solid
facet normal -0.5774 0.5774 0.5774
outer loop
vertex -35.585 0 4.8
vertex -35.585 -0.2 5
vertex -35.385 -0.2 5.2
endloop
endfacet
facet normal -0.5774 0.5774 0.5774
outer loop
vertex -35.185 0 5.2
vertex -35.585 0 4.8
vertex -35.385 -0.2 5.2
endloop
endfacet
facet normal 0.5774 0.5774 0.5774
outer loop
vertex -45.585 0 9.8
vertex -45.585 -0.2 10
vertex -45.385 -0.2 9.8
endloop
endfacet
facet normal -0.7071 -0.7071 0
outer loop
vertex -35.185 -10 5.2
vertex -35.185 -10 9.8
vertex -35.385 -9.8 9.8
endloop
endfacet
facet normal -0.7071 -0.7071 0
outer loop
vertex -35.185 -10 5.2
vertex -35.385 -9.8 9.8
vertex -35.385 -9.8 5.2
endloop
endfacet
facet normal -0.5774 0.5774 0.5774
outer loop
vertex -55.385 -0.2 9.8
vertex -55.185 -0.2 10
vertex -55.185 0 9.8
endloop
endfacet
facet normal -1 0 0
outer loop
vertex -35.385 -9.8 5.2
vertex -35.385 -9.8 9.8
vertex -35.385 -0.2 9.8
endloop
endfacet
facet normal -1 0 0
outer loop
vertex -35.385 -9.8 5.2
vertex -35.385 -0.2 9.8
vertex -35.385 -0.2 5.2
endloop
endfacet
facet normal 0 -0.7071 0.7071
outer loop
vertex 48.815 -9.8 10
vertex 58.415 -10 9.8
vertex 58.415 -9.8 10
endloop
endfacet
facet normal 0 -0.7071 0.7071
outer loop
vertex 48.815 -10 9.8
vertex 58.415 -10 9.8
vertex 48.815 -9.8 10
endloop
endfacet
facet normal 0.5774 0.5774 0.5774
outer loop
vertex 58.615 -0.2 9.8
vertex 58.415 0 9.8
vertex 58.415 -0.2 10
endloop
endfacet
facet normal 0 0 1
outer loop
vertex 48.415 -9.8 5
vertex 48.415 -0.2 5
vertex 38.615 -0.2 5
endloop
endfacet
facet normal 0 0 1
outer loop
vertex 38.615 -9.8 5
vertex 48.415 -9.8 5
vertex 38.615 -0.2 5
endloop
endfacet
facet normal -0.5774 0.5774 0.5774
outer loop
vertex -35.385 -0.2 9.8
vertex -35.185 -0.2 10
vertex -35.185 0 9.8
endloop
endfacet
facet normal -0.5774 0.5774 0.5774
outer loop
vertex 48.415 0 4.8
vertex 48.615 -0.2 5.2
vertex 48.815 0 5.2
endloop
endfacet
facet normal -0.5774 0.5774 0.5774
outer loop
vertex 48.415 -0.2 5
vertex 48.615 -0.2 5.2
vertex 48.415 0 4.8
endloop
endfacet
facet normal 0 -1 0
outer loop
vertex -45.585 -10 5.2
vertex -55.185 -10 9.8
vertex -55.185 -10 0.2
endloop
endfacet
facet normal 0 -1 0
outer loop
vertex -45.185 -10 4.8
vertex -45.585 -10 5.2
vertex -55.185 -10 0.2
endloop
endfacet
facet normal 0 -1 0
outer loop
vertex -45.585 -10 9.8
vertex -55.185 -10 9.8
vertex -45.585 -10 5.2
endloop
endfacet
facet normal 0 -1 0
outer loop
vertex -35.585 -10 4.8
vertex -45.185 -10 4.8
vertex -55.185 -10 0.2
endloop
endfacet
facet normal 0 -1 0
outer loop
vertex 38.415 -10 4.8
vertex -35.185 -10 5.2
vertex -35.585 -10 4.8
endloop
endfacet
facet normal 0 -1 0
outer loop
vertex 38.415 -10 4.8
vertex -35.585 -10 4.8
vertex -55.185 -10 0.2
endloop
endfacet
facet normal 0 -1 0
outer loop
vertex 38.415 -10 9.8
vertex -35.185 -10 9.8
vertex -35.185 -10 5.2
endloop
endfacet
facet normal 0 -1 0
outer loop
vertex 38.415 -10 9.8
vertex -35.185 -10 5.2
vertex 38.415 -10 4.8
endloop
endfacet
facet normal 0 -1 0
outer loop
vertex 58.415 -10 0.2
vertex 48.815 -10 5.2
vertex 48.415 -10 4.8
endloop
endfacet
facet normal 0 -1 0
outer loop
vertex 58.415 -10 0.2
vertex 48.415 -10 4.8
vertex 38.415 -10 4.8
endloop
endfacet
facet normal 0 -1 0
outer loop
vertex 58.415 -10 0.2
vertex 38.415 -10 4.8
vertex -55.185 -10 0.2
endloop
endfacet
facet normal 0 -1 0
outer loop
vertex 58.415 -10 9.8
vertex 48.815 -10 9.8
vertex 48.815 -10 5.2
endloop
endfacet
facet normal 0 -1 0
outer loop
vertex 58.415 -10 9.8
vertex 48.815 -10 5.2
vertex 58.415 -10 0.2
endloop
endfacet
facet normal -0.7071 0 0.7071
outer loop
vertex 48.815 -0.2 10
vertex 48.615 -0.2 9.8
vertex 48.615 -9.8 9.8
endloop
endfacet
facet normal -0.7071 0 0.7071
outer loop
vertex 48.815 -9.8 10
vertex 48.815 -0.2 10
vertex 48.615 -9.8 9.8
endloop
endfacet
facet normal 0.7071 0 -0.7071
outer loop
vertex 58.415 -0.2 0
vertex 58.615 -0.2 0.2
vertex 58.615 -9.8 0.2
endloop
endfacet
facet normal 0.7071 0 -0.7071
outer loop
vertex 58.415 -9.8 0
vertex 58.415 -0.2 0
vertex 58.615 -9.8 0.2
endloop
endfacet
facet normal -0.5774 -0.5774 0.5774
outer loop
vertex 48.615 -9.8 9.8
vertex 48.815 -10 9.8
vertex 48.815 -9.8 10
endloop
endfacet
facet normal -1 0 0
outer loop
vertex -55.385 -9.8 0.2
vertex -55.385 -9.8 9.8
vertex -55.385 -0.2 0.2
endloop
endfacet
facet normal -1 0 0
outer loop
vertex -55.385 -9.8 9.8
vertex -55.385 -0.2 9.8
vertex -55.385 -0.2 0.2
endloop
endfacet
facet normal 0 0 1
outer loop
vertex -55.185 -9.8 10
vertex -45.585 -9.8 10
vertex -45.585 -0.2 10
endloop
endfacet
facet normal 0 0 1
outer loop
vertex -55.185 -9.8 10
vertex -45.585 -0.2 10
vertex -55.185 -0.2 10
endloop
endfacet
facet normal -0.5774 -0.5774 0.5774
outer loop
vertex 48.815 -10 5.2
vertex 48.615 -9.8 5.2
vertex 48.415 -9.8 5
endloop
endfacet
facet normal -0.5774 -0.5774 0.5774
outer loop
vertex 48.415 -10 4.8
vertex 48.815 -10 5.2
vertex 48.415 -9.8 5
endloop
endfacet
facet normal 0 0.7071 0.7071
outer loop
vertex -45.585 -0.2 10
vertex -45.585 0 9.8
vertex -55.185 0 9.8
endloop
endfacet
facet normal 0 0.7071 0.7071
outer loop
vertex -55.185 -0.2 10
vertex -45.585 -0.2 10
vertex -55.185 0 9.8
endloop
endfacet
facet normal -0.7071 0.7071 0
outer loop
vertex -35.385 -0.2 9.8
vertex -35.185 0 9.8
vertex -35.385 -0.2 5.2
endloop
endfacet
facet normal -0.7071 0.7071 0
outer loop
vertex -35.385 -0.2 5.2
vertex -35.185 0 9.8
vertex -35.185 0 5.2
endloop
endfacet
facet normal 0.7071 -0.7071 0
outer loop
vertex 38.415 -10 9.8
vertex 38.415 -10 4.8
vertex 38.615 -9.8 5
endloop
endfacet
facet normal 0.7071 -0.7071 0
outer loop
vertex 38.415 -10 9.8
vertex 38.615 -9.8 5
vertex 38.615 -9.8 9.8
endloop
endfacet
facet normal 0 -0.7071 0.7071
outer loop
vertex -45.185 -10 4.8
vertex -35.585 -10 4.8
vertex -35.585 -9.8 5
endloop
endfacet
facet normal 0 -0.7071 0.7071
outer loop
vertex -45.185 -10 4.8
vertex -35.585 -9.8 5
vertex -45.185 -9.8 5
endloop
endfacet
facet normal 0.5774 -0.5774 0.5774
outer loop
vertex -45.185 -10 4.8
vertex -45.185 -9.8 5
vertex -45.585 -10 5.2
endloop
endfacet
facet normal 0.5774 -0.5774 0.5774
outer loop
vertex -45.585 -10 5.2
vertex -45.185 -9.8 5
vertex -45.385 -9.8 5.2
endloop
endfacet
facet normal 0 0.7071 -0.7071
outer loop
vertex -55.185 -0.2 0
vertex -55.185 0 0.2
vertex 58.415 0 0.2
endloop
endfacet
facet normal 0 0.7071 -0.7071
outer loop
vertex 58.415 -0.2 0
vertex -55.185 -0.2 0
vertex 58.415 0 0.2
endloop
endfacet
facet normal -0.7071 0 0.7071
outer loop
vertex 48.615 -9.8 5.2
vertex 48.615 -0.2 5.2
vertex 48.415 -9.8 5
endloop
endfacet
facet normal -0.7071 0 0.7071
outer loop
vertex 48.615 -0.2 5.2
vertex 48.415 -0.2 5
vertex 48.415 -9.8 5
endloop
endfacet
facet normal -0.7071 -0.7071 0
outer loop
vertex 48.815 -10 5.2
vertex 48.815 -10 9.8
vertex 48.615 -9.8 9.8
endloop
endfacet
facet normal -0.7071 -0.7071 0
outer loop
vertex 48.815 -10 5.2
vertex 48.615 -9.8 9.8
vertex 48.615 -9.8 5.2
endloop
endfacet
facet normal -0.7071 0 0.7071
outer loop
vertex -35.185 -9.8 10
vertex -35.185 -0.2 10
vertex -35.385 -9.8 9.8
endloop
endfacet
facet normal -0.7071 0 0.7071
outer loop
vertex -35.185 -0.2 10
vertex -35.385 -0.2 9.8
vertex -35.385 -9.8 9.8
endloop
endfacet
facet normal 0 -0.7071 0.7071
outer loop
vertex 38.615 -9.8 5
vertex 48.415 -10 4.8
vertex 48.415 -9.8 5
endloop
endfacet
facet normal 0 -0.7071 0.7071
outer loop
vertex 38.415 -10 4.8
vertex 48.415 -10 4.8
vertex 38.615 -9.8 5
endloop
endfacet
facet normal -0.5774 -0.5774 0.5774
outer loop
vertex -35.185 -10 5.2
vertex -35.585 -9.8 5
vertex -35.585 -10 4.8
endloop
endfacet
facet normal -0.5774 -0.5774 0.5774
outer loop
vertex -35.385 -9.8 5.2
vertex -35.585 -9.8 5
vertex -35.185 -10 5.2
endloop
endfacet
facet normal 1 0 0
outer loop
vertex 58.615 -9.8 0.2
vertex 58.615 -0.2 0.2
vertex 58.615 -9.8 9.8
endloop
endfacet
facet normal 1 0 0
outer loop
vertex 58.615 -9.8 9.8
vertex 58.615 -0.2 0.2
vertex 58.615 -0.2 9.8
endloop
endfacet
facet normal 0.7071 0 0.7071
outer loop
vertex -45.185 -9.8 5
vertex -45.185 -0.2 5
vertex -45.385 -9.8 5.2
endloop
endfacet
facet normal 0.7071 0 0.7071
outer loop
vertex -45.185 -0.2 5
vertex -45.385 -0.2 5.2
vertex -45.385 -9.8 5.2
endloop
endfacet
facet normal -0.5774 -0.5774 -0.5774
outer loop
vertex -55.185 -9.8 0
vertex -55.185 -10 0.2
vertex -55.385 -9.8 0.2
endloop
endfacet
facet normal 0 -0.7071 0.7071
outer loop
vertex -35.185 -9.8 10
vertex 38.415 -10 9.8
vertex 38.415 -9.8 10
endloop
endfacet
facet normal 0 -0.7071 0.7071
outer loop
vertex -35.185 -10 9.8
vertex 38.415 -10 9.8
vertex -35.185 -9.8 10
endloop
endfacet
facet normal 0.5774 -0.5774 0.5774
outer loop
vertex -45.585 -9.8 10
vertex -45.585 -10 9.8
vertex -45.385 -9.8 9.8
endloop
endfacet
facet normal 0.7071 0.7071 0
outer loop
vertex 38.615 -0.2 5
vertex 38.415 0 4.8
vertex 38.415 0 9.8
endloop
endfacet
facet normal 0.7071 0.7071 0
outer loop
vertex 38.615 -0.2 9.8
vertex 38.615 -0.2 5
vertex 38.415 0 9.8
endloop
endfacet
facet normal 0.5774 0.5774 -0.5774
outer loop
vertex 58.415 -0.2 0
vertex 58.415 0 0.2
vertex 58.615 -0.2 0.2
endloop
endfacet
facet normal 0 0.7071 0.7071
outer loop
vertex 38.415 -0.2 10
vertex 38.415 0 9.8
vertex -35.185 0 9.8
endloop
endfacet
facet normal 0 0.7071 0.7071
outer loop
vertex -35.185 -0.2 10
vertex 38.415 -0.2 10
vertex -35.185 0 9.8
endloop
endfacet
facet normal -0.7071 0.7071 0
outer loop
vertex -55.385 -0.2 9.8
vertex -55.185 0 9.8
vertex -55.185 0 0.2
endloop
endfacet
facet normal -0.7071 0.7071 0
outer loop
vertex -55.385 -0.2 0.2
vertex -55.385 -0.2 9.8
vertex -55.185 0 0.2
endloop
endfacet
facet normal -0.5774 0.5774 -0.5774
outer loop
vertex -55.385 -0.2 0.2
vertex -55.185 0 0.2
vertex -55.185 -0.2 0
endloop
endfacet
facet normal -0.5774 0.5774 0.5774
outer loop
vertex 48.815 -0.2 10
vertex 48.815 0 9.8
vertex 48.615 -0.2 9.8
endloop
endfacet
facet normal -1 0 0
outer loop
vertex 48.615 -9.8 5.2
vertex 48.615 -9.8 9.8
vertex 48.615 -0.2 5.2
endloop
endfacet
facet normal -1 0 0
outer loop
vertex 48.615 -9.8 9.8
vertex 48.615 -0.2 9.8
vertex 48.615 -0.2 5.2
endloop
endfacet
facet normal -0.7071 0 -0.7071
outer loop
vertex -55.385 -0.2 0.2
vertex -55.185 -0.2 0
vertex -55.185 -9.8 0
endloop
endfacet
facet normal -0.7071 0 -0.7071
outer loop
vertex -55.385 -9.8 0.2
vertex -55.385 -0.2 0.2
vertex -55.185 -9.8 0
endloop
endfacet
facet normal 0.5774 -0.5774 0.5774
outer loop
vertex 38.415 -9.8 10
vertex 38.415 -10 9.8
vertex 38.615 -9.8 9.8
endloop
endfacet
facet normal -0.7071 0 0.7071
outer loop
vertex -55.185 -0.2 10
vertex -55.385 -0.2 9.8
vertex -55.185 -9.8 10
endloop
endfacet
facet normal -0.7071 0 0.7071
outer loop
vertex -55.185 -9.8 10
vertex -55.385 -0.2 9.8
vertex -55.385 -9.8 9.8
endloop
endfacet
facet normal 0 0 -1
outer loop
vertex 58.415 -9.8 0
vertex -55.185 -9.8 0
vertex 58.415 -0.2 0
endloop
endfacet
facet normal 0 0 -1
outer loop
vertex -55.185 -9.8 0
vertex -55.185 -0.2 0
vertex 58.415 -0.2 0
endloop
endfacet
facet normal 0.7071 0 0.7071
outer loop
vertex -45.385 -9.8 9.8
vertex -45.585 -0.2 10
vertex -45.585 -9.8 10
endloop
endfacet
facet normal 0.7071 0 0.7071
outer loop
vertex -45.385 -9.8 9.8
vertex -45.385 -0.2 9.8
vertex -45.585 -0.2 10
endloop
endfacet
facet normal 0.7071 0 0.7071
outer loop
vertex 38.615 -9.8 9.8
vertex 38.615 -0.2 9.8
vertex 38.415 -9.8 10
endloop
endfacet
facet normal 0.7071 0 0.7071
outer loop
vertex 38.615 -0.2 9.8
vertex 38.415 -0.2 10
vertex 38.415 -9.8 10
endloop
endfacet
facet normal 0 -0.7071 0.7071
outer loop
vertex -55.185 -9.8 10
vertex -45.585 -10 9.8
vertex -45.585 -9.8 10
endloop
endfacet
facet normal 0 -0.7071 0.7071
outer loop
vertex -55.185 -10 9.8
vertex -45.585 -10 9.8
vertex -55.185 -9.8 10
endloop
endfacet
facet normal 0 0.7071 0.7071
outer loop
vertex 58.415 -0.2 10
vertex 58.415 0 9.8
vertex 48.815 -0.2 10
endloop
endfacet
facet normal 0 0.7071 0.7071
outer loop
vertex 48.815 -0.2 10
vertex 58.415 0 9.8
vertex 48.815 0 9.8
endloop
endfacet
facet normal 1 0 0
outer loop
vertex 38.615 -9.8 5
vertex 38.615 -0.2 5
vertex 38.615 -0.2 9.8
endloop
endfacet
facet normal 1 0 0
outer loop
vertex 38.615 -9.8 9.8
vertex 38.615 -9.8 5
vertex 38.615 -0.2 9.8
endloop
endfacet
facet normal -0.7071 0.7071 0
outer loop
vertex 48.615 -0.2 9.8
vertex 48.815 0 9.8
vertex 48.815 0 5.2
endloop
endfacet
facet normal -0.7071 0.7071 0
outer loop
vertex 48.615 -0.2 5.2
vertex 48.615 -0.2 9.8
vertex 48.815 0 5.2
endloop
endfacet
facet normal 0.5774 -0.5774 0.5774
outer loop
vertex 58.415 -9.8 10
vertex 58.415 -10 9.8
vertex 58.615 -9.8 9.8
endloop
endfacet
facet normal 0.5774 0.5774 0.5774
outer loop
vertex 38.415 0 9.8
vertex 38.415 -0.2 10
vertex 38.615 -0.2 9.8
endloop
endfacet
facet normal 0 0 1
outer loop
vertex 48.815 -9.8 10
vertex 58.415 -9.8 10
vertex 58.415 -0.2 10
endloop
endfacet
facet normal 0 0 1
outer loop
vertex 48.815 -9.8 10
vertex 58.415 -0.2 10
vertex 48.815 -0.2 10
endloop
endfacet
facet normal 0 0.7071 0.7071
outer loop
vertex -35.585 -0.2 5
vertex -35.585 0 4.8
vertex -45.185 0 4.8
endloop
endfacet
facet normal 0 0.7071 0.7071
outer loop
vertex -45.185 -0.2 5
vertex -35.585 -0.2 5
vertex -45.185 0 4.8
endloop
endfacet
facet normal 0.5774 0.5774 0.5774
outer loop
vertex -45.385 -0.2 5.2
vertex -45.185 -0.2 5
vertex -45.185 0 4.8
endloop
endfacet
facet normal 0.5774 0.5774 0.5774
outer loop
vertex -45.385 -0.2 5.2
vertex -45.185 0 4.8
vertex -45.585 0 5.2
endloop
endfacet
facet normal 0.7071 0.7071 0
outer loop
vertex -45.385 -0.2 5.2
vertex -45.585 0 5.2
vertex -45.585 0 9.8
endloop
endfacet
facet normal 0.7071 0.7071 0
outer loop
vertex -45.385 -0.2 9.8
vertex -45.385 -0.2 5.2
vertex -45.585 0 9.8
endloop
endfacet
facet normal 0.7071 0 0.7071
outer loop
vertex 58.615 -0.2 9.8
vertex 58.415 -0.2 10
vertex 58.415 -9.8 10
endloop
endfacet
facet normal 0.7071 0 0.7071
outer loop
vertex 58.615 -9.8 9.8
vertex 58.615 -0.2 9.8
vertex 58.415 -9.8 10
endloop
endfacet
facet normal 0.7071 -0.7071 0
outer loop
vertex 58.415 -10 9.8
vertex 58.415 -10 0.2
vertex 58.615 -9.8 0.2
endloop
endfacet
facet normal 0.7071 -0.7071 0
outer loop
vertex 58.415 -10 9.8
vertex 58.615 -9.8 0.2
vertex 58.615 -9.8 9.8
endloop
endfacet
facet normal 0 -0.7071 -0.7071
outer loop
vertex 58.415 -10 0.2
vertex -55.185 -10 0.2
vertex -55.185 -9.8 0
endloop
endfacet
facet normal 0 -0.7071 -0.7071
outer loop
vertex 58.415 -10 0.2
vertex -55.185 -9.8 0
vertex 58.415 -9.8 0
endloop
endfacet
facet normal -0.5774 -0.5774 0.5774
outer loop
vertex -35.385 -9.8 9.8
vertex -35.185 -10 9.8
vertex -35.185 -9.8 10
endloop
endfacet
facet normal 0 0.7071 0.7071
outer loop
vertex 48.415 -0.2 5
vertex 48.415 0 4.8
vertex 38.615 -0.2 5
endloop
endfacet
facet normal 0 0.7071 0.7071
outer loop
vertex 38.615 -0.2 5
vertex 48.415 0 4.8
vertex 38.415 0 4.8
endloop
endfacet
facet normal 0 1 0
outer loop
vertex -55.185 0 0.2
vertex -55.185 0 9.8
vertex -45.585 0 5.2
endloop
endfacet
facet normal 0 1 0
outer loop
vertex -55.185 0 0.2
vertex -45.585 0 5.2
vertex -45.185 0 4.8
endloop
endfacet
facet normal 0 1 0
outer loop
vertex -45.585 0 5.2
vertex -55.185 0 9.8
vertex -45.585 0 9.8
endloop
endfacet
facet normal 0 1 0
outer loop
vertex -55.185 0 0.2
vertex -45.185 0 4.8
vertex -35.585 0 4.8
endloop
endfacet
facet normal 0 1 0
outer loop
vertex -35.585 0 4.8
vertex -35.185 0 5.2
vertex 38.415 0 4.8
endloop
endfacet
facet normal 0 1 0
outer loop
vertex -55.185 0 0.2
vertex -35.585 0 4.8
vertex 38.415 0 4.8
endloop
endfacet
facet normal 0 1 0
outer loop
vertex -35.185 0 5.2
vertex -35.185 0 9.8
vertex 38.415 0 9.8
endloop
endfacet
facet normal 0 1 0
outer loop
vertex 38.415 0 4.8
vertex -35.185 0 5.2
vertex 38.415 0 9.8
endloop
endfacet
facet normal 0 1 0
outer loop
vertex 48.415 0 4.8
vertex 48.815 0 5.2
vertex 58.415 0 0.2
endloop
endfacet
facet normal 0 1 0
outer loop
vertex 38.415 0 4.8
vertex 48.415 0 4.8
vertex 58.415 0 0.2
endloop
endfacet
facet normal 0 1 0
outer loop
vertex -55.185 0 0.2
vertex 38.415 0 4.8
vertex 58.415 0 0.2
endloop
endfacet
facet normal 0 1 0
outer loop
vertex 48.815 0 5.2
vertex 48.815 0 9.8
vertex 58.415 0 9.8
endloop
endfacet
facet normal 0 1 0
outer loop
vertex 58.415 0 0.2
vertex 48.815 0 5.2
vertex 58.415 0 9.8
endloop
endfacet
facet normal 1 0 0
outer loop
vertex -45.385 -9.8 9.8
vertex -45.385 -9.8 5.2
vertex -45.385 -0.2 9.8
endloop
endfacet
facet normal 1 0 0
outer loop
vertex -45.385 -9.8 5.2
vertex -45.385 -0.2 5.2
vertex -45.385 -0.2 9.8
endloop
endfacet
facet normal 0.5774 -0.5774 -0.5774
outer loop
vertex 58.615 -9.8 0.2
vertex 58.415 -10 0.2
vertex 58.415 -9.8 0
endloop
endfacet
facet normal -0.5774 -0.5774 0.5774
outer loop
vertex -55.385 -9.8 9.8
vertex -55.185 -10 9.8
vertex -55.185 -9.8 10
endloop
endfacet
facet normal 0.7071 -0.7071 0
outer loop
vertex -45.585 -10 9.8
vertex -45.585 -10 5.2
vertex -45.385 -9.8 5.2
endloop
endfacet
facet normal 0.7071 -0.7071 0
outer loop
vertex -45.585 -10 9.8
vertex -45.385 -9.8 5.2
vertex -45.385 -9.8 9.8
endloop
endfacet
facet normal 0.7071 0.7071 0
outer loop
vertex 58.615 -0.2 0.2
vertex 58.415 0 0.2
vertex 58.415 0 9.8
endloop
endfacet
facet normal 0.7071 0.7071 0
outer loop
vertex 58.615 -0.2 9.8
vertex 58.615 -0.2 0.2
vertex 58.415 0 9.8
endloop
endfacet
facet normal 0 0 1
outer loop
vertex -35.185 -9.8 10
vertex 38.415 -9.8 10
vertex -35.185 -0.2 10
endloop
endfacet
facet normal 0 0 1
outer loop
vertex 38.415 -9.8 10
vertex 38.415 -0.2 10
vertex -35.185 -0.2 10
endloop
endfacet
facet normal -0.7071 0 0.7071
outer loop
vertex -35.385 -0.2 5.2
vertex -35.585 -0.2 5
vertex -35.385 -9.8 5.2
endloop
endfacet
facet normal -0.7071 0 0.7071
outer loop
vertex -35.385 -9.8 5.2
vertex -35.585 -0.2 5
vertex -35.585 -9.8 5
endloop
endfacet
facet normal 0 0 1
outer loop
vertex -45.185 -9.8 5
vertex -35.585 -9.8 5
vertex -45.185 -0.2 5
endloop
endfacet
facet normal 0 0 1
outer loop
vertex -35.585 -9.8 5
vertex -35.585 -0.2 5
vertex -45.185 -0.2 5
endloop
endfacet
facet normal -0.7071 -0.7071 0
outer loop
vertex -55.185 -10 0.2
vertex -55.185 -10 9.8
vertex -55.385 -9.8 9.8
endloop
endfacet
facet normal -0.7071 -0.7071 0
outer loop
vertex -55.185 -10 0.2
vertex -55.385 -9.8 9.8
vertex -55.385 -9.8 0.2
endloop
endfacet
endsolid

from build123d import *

# Parameters (mm, degrees)
F1_DEPTH = 10
F2_SIZE  = 0.2


with BuildPart() as f1:
    # F0 (on Front) → F1 (new body)
    with BuildSketch(Plane.XZ):
        Polygon((-45.385001, 10), (-55.385001, 10), (-55.385001, 0), (58.614999, 0), (58.614999, 10), (48.614999, 10), (48.614999, 5), (38.614999, 5), (38.614999, 10), (-35.385001, 10), (-35.385001, 5), (-45.385001, 5), align=None)
    extrude(amount=F1_DEPTH)

    # F2
    f2_edges = [f1.edges().sort_by_distance(p)[0] for p in [
        (-40.385001, -10, 5),
        (-45.385001, -10, 7.5),
        (-50.385001, -10, 10),
        (-55.385001, -10, 5),
        (1.614999, -10, 0),
        (58.614999, -10, 5),
        (53.614999, -10, 10),
        (48.614999, -10, 7.5),
        (43.614999, -10, 5),
        (38.614999, -10, 7.5),
        (1.614999, -10, 10),
        (-35.385001, -10, 7.5),
        (38.614999, -5, 10),
        (-35.385001, -5, 10),
        (1.614999, 0, 10),
        (-35.385001, -5, 5),
        (-45.385001, -5, 5),
        (-40.385001, 0, 5),
        (-45.385001, -5, 10),
        (-55.385001, -5, 10),
        (-50.385001, 0, 10),
        (-45.385001, 0, 7.5),
        (-55.385001, 0, 5),
        (1.614999, 0, 0),
        (58.614999, 0, 5),
        (53.614999, 0, 10),
        (48.614999, 0, 7.5),
        (43.614999, 0, 5),
        (38.614999, 0, 7.5),
        (-35.385001, 0, 7.5),
        (58.614999, -5, 0),
        (58.614999, -5, 10),
        (48.614999, -5, 10),
        (48.614999, -5, 5),
        (-55.385001, -5, 0),
    ]]
    chamfer(f2_edges, length=F2_SIZE)


solid = f1.part
